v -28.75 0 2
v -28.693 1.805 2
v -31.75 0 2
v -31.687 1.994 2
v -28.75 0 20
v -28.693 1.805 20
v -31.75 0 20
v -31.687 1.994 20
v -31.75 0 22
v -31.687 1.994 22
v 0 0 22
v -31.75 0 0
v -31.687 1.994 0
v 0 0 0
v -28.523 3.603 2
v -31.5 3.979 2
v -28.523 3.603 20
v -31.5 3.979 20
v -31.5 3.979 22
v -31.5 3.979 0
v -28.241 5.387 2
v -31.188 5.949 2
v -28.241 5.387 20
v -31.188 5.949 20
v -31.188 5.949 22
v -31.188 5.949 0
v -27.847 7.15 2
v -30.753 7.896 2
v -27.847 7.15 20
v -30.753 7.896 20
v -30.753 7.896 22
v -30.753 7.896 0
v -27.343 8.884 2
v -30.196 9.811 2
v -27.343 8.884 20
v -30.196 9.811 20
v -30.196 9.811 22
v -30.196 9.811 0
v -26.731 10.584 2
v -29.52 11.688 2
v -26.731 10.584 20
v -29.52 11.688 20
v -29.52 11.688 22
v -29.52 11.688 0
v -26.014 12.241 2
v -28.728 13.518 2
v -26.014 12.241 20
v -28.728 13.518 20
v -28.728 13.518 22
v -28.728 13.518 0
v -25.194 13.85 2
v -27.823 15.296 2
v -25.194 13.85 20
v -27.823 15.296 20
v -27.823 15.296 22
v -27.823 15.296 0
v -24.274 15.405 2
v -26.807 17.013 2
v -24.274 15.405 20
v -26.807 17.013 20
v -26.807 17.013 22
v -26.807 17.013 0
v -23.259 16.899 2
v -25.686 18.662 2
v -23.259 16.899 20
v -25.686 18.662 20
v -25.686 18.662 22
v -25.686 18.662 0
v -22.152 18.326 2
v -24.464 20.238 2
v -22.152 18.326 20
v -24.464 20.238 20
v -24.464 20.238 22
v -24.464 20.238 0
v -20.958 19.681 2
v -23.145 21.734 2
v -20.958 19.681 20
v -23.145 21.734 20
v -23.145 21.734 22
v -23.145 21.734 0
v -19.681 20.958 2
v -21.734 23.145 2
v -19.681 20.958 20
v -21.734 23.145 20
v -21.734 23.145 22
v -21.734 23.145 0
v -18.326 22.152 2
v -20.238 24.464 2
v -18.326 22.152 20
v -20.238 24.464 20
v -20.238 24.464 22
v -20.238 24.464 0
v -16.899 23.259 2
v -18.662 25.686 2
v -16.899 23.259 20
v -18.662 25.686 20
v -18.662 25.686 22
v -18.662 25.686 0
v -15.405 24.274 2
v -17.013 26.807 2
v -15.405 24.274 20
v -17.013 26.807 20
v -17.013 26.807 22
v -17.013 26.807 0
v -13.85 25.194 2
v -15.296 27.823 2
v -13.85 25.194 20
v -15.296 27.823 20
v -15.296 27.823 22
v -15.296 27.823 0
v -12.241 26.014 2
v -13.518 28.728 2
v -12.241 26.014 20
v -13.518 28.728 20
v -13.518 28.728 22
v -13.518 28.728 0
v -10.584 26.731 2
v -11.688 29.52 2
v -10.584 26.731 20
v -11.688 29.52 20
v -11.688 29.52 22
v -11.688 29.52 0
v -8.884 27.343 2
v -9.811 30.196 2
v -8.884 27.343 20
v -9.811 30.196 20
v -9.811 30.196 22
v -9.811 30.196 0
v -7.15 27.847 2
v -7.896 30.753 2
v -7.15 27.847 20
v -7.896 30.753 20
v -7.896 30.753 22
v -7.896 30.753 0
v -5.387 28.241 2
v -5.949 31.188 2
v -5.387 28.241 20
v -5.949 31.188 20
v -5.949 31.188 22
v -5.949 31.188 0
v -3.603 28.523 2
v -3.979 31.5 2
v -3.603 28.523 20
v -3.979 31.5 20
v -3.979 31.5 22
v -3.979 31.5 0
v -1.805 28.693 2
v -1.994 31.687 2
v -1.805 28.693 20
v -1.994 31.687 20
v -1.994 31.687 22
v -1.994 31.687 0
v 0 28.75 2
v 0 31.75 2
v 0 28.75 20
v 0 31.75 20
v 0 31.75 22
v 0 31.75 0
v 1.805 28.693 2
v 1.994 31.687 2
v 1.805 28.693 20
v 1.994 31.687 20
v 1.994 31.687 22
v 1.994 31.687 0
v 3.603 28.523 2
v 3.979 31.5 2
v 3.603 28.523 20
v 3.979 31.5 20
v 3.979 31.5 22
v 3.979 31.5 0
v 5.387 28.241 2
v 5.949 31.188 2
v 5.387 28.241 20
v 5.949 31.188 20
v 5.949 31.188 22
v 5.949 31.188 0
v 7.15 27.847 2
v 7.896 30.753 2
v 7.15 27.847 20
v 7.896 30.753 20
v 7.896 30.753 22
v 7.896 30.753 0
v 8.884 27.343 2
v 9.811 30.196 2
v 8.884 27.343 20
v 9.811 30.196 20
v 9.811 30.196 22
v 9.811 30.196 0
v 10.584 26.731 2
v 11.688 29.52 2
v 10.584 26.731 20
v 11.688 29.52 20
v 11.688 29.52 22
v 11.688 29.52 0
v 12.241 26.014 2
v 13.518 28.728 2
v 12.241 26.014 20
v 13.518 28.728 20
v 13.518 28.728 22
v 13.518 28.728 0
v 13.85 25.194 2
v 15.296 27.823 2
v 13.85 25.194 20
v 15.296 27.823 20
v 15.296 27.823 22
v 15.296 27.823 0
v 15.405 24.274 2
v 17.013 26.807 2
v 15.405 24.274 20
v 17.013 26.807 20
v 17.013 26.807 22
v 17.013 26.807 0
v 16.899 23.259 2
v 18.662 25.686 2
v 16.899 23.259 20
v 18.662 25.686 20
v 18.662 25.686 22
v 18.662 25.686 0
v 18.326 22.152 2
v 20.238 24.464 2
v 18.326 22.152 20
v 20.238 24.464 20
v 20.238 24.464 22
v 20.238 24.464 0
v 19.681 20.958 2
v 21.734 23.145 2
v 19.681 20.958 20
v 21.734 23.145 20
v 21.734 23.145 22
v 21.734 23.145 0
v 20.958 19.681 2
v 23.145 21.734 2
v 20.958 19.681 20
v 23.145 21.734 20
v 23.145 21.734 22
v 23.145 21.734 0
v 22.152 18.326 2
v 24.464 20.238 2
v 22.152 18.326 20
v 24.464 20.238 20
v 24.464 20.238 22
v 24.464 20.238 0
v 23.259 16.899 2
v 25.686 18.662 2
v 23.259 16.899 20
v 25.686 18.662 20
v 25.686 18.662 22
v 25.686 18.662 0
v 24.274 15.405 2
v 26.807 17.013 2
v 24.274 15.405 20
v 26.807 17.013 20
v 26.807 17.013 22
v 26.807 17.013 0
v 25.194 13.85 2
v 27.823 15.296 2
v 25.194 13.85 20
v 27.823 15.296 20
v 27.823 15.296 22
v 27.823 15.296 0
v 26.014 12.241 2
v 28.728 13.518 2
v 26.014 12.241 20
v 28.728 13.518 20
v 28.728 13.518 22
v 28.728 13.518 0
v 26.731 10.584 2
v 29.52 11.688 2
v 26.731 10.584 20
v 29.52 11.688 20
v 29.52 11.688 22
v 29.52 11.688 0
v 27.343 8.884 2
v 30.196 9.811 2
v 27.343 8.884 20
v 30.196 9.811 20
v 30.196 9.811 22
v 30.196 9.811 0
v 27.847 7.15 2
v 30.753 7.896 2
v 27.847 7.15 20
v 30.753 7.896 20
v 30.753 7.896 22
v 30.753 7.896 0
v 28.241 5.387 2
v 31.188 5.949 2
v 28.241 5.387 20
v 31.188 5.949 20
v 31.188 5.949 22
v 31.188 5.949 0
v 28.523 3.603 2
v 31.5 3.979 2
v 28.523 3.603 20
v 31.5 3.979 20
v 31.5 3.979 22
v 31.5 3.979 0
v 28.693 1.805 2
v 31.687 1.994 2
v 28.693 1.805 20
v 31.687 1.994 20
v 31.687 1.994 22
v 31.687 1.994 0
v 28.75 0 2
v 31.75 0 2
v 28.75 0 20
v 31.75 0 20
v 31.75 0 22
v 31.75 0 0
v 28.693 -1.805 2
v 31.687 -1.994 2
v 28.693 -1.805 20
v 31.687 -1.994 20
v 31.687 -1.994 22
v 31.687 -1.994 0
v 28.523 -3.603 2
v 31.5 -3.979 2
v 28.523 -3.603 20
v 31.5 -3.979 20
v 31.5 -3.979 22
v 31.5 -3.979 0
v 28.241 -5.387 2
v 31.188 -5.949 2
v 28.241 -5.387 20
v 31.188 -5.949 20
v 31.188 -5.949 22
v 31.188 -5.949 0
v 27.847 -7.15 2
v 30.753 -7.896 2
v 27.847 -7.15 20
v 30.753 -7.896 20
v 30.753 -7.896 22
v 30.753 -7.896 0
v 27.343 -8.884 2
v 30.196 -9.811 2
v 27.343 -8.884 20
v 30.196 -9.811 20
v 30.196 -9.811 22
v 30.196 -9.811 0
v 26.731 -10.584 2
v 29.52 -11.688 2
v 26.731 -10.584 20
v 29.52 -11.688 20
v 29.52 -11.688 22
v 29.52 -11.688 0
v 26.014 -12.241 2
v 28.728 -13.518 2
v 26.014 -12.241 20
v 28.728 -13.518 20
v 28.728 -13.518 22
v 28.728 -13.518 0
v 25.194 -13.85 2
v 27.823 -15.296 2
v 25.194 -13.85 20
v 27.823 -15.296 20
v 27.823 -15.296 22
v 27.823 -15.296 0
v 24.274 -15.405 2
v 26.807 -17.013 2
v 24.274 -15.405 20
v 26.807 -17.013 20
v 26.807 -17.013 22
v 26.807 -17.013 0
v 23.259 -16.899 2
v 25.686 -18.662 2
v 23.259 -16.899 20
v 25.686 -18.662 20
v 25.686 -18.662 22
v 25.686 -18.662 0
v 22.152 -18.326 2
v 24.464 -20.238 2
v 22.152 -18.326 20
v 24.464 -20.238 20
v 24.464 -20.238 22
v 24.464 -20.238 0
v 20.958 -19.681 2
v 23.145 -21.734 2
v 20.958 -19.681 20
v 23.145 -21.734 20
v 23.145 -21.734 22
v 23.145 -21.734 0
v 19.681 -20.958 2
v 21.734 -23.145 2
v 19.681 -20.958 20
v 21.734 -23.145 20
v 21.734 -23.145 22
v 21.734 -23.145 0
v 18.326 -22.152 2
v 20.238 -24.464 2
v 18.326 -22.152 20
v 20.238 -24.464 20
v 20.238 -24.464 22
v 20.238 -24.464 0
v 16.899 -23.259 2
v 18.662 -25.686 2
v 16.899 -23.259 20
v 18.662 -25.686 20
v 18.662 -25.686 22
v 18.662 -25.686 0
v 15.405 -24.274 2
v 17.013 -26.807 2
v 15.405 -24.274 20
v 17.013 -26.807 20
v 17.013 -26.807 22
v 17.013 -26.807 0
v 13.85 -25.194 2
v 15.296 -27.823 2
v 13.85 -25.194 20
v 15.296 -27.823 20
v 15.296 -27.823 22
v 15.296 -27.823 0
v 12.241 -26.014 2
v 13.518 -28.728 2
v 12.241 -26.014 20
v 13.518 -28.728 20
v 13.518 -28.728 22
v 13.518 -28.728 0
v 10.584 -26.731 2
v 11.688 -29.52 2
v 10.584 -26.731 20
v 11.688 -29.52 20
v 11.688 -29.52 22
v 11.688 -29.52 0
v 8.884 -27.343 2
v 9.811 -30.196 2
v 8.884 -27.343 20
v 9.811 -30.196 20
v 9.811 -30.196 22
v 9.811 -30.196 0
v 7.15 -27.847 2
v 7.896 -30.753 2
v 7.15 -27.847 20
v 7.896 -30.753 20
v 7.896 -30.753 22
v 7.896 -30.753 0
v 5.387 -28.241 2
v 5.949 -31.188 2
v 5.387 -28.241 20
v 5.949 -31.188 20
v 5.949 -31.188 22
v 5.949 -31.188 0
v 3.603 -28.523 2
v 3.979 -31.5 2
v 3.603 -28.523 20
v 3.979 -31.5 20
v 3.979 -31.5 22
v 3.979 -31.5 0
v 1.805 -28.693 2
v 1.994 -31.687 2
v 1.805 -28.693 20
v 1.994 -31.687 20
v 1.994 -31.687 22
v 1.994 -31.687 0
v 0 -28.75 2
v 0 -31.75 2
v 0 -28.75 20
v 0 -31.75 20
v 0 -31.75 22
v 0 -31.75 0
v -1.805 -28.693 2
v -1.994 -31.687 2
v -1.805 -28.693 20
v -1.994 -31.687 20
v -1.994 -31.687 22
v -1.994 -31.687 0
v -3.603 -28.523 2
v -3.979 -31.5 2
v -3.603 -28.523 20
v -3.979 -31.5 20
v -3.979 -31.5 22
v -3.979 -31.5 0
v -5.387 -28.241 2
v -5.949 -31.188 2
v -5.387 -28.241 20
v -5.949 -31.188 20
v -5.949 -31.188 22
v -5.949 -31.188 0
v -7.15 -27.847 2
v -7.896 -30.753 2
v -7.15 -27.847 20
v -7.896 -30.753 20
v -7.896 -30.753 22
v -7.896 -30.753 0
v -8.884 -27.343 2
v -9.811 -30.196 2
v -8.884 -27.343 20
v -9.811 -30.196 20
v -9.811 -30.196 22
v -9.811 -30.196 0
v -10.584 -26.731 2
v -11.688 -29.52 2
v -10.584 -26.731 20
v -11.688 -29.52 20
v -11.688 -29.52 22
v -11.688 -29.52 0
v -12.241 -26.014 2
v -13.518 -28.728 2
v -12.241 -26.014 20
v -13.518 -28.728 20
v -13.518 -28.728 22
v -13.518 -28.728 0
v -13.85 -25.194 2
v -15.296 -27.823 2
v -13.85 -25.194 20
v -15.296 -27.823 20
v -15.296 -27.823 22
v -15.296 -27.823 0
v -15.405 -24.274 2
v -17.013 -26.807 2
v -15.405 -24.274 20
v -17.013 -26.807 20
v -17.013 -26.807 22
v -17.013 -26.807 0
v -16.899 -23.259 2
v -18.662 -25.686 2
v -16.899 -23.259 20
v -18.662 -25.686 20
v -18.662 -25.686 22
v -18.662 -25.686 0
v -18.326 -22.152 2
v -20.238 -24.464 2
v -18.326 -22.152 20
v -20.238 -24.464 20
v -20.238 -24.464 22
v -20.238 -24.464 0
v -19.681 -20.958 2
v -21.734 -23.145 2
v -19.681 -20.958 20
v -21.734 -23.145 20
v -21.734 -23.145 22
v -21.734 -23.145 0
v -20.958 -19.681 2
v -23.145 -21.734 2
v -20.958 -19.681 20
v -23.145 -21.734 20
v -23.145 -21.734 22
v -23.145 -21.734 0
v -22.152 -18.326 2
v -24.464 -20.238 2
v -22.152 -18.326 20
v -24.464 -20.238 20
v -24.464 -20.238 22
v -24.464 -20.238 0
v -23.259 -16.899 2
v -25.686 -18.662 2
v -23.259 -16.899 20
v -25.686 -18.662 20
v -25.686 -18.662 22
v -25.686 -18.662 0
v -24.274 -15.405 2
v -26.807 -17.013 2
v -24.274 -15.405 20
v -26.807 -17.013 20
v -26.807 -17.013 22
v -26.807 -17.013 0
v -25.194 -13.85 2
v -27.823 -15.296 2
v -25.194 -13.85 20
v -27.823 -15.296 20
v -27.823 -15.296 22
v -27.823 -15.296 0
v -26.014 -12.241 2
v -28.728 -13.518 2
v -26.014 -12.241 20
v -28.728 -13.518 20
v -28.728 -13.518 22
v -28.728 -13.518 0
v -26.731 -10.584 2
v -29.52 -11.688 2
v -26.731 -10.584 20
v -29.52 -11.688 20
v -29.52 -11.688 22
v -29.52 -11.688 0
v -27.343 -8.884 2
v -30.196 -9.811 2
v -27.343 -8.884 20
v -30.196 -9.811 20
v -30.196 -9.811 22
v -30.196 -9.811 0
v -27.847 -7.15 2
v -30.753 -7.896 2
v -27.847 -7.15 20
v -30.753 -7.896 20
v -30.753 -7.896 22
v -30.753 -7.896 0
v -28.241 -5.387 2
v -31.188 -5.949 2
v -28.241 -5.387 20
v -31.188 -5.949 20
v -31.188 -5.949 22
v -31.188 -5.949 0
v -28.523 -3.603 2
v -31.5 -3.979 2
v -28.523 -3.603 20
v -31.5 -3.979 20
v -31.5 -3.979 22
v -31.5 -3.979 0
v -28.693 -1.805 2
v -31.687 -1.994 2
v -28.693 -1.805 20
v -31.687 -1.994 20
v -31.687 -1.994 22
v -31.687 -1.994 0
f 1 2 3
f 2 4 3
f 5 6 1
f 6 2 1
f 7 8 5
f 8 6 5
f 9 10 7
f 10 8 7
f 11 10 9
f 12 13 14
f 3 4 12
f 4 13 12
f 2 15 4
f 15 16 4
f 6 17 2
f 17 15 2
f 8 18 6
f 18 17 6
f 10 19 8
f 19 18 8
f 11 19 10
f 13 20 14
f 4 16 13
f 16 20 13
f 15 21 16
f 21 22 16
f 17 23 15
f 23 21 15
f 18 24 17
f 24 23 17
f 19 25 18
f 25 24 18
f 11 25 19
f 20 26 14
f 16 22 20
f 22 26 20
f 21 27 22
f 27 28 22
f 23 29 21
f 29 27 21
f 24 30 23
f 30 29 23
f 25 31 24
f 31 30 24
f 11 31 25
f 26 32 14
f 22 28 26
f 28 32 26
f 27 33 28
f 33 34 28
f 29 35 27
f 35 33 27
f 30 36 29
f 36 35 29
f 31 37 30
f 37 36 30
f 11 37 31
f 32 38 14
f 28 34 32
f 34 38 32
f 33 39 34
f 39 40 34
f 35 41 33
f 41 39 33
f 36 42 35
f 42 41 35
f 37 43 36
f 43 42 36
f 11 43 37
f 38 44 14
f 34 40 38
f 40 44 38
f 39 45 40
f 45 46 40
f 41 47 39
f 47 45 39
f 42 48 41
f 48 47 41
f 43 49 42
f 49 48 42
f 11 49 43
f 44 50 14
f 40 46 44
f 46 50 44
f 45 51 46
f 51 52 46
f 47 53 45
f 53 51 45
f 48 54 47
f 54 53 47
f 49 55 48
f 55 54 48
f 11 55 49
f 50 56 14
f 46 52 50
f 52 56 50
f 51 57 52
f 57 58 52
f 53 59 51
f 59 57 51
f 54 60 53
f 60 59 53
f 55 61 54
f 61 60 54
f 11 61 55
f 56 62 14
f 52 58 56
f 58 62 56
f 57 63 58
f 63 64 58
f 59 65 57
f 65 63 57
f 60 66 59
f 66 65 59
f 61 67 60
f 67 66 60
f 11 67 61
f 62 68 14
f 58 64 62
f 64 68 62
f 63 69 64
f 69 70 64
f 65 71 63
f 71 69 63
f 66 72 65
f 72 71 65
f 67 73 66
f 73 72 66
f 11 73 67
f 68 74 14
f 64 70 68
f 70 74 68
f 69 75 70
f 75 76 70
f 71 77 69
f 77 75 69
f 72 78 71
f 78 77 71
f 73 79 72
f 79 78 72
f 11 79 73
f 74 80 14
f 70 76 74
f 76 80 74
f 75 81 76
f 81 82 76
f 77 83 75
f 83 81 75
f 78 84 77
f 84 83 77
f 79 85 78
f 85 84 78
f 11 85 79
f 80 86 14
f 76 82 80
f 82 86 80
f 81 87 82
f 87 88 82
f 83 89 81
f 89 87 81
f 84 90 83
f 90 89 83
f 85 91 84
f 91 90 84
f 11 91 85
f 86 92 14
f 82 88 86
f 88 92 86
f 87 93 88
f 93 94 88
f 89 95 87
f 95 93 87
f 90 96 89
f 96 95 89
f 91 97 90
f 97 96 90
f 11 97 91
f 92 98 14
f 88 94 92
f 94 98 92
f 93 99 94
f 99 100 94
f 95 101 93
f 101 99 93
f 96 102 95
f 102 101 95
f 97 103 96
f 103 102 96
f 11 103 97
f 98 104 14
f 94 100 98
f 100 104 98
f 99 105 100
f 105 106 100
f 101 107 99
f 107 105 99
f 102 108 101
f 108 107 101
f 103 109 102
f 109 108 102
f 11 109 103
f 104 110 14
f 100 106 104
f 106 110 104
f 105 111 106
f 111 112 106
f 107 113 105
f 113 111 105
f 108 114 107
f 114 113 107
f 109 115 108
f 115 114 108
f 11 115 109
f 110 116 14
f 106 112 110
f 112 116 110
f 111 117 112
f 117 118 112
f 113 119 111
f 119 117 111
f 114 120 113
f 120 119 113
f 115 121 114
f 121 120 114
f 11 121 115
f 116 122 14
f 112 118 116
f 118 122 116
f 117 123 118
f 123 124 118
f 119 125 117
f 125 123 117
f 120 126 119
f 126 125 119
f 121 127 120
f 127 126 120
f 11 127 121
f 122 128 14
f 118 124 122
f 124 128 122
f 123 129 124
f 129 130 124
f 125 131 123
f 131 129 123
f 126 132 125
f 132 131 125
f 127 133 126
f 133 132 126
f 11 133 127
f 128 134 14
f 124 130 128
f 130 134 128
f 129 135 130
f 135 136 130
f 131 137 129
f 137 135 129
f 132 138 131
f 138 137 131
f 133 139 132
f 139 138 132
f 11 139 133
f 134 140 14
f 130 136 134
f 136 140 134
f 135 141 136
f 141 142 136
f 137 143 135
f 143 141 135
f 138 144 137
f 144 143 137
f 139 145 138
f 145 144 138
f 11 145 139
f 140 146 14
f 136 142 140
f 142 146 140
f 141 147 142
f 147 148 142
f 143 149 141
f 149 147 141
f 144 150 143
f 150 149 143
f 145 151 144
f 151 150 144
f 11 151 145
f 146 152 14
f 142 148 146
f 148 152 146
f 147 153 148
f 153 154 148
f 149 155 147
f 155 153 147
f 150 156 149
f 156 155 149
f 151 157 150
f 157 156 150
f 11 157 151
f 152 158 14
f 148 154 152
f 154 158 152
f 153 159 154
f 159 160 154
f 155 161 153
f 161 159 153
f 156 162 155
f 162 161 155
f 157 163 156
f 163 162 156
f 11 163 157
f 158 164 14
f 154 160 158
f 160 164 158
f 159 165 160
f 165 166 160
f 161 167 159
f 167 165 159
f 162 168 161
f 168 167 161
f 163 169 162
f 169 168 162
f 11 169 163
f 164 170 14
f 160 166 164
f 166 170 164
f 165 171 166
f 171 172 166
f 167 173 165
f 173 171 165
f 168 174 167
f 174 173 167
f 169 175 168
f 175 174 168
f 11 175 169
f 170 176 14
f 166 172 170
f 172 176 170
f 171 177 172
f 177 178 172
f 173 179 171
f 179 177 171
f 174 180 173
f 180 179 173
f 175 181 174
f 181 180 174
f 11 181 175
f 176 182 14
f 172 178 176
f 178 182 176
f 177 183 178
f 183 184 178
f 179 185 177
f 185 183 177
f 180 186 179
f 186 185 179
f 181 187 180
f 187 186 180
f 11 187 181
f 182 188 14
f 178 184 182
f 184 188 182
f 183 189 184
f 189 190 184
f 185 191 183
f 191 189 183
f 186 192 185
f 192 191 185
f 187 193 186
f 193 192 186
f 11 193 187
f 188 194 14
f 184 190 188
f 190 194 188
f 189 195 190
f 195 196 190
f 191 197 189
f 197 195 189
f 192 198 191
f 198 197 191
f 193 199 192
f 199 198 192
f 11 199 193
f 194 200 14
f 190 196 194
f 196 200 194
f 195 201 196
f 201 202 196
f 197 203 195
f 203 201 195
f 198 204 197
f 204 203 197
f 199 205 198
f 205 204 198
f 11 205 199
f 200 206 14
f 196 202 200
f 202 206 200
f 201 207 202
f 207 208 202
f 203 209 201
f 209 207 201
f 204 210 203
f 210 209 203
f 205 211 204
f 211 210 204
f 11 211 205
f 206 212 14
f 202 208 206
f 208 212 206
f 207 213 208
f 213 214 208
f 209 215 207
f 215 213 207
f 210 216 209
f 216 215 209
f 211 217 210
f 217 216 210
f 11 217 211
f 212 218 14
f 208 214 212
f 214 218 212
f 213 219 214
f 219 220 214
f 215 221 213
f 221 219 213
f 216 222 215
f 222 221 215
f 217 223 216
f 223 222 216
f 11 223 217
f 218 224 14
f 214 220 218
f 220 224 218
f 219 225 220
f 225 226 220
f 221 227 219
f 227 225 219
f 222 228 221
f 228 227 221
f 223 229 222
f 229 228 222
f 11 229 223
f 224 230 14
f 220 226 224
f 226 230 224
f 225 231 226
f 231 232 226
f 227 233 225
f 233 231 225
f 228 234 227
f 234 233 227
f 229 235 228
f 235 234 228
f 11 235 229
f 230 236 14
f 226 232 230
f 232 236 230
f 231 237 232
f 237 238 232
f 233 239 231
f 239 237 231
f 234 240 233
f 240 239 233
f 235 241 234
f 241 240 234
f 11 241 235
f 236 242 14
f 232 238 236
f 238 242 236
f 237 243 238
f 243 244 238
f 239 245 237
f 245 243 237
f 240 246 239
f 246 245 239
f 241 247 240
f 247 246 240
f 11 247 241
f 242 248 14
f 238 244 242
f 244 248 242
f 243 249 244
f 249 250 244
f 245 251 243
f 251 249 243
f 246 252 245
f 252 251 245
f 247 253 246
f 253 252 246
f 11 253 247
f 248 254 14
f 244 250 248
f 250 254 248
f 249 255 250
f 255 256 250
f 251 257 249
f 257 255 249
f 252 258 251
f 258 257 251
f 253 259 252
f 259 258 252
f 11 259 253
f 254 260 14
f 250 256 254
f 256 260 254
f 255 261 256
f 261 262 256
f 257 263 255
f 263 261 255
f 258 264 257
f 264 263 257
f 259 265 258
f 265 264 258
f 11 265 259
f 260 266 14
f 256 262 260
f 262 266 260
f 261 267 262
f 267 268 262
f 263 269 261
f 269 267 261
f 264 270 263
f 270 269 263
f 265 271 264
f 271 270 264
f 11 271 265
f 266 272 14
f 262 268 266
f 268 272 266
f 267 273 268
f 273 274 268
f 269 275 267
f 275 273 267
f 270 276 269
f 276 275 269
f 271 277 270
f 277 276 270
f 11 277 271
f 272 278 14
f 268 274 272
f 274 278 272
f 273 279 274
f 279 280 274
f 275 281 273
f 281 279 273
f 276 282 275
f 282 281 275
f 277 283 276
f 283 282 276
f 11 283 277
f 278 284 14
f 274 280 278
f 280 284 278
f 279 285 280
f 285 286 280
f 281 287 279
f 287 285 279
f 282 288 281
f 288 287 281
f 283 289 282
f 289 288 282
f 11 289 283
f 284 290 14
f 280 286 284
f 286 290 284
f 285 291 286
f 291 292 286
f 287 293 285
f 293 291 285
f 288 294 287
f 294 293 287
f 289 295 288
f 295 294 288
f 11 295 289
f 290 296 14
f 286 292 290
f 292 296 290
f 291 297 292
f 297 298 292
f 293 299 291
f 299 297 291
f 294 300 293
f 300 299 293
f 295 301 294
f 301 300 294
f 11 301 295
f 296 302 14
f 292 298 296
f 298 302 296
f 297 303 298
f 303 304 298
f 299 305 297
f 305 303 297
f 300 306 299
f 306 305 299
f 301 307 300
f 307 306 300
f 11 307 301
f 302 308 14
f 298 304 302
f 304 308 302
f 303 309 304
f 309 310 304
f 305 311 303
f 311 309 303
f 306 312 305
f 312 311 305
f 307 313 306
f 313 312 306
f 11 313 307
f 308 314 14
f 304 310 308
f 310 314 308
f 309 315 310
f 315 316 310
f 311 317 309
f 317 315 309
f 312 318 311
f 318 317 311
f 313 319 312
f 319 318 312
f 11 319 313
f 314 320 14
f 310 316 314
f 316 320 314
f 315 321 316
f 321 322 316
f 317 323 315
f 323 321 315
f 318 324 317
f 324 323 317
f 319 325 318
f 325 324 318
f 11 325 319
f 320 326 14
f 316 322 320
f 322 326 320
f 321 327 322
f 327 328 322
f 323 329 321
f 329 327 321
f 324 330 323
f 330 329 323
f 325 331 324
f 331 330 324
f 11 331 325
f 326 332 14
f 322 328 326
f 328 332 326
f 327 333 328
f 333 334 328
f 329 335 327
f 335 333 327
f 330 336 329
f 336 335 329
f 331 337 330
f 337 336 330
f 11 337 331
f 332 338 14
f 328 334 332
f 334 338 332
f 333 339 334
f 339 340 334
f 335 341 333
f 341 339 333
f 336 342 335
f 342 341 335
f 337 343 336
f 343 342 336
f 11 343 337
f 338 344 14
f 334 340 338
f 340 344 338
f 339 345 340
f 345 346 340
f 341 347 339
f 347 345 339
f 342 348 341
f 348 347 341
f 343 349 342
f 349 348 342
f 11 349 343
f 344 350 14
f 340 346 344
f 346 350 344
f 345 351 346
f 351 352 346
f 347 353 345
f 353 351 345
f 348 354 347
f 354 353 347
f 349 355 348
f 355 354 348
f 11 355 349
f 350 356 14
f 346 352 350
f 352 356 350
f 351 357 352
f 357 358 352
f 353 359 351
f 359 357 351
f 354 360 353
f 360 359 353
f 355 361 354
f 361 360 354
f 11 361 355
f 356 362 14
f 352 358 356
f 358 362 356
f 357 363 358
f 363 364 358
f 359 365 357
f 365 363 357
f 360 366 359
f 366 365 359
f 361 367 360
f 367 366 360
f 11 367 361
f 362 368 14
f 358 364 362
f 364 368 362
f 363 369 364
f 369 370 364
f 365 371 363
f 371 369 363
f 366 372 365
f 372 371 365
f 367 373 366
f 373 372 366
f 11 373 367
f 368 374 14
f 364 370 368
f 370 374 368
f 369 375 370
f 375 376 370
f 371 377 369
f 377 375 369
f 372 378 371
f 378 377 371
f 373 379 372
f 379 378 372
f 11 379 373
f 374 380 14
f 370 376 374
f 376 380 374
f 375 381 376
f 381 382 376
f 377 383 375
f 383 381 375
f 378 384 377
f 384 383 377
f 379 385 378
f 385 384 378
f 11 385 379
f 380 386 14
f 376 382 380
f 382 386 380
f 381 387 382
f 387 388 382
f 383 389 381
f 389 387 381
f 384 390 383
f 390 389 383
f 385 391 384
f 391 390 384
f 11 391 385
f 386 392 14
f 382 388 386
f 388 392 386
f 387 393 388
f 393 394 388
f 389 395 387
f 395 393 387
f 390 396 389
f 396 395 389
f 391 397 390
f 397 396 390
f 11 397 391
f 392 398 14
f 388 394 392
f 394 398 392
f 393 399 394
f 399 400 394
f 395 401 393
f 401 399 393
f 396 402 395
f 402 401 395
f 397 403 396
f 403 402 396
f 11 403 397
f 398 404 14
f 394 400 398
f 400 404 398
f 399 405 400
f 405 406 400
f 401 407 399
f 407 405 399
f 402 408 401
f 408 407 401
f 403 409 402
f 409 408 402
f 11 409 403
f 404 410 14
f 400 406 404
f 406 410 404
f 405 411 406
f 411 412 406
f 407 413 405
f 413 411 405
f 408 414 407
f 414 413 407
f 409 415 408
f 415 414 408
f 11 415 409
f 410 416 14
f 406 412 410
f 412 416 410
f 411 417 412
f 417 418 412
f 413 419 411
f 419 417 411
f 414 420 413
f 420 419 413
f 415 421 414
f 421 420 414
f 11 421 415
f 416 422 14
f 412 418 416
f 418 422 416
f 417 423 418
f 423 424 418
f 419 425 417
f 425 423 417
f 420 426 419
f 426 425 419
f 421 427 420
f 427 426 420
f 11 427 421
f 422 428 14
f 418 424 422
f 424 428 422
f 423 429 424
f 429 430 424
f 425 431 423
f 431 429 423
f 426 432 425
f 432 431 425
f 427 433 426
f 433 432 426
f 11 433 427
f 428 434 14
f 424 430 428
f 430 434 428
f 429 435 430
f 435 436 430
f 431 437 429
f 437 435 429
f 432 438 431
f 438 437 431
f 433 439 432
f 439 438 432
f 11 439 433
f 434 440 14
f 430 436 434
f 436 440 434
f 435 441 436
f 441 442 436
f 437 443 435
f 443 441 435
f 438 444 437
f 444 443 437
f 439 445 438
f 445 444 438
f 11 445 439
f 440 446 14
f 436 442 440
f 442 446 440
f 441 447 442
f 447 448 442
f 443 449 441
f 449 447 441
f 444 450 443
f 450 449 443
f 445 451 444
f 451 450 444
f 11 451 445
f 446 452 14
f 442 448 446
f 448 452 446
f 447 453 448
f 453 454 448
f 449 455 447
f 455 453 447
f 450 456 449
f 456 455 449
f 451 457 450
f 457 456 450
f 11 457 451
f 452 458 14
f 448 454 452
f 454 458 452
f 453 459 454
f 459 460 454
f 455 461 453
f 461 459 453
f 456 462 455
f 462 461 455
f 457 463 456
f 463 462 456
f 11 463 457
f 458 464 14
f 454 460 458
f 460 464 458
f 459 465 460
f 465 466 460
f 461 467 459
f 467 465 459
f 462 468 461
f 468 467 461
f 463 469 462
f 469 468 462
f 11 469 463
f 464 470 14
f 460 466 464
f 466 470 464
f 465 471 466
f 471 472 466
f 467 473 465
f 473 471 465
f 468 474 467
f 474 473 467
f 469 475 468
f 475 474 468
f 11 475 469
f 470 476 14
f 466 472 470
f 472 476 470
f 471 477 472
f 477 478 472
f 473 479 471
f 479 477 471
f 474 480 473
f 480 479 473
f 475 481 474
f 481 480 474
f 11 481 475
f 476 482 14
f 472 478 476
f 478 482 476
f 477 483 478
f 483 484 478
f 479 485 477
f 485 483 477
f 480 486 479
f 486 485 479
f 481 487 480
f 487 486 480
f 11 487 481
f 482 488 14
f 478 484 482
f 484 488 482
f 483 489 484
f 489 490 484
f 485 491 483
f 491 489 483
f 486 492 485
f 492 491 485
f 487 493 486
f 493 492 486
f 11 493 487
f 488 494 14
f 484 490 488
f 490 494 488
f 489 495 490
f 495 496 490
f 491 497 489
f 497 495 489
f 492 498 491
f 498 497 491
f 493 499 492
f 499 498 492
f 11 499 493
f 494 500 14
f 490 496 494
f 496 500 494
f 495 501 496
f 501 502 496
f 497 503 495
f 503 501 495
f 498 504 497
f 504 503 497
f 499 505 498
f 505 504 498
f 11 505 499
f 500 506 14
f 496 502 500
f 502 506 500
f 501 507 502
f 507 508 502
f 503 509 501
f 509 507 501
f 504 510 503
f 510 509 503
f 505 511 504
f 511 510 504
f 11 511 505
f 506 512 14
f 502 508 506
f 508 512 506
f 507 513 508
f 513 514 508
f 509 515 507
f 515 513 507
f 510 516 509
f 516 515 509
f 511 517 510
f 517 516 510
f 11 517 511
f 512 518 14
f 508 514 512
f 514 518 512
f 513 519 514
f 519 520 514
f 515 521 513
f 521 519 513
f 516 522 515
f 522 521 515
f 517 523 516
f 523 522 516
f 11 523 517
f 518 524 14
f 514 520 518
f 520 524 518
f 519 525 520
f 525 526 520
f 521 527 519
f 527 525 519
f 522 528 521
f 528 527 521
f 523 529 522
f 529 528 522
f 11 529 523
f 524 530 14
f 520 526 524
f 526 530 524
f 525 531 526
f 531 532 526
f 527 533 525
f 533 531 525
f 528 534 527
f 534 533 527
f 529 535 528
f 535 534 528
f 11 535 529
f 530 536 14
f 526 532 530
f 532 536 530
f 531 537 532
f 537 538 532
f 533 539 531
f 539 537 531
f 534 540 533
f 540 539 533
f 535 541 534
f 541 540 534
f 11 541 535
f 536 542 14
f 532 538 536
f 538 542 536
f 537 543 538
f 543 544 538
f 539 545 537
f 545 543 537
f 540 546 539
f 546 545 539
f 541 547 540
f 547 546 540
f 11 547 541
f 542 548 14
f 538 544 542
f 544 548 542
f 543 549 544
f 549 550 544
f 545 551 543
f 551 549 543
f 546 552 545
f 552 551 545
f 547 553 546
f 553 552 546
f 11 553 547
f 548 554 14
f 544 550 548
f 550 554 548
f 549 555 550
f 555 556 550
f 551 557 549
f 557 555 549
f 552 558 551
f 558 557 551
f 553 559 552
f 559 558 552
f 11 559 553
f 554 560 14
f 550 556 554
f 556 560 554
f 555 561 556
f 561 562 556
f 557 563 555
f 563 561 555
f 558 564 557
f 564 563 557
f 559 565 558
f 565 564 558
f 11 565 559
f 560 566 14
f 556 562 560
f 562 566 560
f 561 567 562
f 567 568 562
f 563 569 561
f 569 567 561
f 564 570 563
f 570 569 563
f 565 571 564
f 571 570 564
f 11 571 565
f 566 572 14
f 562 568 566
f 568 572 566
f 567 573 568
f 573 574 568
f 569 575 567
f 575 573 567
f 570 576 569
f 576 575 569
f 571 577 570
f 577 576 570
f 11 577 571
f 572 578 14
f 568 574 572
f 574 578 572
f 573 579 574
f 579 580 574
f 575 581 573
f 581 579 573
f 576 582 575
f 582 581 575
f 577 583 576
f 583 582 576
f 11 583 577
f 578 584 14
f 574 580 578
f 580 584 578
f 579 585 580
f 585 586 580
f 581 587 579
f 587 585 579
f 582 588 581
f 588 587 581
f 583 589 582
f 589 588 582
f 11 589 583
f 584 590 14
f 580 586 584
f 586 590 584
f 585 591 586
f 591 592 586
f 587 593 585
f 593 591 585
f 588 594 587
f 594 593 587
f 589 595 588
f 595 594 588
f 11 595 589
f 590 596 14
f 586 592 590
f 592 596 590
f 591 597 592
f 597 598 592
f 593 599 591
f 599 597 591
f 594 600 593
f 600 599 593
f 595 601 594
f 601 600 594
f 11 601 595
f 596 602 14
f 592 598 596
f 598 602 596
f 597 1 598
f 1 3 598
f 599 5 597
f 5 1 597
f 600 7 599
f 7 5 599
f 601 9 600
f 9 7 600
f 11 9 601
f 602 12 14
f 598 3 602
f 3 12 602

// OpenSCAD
diam = 57.5;
h = 22;
ledge=[2, 3];
supports=180;
supportd=0.9;
supportc=0.1;

$fn=100;


rotate_extrude()
{
	wheel_profile();
}

*wheel_support();



module wheel_profile()
{
	square([diam/2, h]);

	translate([0,h-ledge[0]])
	square([diam/2+ledge[1], ledge[0]]);
	square([diam/2+ledge[1], ledge[0]]);
}

module wheel_support()
{
	for (i = [0:supports])
	{
		rotate(360/supports*i,[0,0,1])
			translate([diam/2+ledge[1]-supportd/2,0,ledge[0]])
				cylinder(h-2*ledge[0]-supportc,d=supportd);
	}
	
}
